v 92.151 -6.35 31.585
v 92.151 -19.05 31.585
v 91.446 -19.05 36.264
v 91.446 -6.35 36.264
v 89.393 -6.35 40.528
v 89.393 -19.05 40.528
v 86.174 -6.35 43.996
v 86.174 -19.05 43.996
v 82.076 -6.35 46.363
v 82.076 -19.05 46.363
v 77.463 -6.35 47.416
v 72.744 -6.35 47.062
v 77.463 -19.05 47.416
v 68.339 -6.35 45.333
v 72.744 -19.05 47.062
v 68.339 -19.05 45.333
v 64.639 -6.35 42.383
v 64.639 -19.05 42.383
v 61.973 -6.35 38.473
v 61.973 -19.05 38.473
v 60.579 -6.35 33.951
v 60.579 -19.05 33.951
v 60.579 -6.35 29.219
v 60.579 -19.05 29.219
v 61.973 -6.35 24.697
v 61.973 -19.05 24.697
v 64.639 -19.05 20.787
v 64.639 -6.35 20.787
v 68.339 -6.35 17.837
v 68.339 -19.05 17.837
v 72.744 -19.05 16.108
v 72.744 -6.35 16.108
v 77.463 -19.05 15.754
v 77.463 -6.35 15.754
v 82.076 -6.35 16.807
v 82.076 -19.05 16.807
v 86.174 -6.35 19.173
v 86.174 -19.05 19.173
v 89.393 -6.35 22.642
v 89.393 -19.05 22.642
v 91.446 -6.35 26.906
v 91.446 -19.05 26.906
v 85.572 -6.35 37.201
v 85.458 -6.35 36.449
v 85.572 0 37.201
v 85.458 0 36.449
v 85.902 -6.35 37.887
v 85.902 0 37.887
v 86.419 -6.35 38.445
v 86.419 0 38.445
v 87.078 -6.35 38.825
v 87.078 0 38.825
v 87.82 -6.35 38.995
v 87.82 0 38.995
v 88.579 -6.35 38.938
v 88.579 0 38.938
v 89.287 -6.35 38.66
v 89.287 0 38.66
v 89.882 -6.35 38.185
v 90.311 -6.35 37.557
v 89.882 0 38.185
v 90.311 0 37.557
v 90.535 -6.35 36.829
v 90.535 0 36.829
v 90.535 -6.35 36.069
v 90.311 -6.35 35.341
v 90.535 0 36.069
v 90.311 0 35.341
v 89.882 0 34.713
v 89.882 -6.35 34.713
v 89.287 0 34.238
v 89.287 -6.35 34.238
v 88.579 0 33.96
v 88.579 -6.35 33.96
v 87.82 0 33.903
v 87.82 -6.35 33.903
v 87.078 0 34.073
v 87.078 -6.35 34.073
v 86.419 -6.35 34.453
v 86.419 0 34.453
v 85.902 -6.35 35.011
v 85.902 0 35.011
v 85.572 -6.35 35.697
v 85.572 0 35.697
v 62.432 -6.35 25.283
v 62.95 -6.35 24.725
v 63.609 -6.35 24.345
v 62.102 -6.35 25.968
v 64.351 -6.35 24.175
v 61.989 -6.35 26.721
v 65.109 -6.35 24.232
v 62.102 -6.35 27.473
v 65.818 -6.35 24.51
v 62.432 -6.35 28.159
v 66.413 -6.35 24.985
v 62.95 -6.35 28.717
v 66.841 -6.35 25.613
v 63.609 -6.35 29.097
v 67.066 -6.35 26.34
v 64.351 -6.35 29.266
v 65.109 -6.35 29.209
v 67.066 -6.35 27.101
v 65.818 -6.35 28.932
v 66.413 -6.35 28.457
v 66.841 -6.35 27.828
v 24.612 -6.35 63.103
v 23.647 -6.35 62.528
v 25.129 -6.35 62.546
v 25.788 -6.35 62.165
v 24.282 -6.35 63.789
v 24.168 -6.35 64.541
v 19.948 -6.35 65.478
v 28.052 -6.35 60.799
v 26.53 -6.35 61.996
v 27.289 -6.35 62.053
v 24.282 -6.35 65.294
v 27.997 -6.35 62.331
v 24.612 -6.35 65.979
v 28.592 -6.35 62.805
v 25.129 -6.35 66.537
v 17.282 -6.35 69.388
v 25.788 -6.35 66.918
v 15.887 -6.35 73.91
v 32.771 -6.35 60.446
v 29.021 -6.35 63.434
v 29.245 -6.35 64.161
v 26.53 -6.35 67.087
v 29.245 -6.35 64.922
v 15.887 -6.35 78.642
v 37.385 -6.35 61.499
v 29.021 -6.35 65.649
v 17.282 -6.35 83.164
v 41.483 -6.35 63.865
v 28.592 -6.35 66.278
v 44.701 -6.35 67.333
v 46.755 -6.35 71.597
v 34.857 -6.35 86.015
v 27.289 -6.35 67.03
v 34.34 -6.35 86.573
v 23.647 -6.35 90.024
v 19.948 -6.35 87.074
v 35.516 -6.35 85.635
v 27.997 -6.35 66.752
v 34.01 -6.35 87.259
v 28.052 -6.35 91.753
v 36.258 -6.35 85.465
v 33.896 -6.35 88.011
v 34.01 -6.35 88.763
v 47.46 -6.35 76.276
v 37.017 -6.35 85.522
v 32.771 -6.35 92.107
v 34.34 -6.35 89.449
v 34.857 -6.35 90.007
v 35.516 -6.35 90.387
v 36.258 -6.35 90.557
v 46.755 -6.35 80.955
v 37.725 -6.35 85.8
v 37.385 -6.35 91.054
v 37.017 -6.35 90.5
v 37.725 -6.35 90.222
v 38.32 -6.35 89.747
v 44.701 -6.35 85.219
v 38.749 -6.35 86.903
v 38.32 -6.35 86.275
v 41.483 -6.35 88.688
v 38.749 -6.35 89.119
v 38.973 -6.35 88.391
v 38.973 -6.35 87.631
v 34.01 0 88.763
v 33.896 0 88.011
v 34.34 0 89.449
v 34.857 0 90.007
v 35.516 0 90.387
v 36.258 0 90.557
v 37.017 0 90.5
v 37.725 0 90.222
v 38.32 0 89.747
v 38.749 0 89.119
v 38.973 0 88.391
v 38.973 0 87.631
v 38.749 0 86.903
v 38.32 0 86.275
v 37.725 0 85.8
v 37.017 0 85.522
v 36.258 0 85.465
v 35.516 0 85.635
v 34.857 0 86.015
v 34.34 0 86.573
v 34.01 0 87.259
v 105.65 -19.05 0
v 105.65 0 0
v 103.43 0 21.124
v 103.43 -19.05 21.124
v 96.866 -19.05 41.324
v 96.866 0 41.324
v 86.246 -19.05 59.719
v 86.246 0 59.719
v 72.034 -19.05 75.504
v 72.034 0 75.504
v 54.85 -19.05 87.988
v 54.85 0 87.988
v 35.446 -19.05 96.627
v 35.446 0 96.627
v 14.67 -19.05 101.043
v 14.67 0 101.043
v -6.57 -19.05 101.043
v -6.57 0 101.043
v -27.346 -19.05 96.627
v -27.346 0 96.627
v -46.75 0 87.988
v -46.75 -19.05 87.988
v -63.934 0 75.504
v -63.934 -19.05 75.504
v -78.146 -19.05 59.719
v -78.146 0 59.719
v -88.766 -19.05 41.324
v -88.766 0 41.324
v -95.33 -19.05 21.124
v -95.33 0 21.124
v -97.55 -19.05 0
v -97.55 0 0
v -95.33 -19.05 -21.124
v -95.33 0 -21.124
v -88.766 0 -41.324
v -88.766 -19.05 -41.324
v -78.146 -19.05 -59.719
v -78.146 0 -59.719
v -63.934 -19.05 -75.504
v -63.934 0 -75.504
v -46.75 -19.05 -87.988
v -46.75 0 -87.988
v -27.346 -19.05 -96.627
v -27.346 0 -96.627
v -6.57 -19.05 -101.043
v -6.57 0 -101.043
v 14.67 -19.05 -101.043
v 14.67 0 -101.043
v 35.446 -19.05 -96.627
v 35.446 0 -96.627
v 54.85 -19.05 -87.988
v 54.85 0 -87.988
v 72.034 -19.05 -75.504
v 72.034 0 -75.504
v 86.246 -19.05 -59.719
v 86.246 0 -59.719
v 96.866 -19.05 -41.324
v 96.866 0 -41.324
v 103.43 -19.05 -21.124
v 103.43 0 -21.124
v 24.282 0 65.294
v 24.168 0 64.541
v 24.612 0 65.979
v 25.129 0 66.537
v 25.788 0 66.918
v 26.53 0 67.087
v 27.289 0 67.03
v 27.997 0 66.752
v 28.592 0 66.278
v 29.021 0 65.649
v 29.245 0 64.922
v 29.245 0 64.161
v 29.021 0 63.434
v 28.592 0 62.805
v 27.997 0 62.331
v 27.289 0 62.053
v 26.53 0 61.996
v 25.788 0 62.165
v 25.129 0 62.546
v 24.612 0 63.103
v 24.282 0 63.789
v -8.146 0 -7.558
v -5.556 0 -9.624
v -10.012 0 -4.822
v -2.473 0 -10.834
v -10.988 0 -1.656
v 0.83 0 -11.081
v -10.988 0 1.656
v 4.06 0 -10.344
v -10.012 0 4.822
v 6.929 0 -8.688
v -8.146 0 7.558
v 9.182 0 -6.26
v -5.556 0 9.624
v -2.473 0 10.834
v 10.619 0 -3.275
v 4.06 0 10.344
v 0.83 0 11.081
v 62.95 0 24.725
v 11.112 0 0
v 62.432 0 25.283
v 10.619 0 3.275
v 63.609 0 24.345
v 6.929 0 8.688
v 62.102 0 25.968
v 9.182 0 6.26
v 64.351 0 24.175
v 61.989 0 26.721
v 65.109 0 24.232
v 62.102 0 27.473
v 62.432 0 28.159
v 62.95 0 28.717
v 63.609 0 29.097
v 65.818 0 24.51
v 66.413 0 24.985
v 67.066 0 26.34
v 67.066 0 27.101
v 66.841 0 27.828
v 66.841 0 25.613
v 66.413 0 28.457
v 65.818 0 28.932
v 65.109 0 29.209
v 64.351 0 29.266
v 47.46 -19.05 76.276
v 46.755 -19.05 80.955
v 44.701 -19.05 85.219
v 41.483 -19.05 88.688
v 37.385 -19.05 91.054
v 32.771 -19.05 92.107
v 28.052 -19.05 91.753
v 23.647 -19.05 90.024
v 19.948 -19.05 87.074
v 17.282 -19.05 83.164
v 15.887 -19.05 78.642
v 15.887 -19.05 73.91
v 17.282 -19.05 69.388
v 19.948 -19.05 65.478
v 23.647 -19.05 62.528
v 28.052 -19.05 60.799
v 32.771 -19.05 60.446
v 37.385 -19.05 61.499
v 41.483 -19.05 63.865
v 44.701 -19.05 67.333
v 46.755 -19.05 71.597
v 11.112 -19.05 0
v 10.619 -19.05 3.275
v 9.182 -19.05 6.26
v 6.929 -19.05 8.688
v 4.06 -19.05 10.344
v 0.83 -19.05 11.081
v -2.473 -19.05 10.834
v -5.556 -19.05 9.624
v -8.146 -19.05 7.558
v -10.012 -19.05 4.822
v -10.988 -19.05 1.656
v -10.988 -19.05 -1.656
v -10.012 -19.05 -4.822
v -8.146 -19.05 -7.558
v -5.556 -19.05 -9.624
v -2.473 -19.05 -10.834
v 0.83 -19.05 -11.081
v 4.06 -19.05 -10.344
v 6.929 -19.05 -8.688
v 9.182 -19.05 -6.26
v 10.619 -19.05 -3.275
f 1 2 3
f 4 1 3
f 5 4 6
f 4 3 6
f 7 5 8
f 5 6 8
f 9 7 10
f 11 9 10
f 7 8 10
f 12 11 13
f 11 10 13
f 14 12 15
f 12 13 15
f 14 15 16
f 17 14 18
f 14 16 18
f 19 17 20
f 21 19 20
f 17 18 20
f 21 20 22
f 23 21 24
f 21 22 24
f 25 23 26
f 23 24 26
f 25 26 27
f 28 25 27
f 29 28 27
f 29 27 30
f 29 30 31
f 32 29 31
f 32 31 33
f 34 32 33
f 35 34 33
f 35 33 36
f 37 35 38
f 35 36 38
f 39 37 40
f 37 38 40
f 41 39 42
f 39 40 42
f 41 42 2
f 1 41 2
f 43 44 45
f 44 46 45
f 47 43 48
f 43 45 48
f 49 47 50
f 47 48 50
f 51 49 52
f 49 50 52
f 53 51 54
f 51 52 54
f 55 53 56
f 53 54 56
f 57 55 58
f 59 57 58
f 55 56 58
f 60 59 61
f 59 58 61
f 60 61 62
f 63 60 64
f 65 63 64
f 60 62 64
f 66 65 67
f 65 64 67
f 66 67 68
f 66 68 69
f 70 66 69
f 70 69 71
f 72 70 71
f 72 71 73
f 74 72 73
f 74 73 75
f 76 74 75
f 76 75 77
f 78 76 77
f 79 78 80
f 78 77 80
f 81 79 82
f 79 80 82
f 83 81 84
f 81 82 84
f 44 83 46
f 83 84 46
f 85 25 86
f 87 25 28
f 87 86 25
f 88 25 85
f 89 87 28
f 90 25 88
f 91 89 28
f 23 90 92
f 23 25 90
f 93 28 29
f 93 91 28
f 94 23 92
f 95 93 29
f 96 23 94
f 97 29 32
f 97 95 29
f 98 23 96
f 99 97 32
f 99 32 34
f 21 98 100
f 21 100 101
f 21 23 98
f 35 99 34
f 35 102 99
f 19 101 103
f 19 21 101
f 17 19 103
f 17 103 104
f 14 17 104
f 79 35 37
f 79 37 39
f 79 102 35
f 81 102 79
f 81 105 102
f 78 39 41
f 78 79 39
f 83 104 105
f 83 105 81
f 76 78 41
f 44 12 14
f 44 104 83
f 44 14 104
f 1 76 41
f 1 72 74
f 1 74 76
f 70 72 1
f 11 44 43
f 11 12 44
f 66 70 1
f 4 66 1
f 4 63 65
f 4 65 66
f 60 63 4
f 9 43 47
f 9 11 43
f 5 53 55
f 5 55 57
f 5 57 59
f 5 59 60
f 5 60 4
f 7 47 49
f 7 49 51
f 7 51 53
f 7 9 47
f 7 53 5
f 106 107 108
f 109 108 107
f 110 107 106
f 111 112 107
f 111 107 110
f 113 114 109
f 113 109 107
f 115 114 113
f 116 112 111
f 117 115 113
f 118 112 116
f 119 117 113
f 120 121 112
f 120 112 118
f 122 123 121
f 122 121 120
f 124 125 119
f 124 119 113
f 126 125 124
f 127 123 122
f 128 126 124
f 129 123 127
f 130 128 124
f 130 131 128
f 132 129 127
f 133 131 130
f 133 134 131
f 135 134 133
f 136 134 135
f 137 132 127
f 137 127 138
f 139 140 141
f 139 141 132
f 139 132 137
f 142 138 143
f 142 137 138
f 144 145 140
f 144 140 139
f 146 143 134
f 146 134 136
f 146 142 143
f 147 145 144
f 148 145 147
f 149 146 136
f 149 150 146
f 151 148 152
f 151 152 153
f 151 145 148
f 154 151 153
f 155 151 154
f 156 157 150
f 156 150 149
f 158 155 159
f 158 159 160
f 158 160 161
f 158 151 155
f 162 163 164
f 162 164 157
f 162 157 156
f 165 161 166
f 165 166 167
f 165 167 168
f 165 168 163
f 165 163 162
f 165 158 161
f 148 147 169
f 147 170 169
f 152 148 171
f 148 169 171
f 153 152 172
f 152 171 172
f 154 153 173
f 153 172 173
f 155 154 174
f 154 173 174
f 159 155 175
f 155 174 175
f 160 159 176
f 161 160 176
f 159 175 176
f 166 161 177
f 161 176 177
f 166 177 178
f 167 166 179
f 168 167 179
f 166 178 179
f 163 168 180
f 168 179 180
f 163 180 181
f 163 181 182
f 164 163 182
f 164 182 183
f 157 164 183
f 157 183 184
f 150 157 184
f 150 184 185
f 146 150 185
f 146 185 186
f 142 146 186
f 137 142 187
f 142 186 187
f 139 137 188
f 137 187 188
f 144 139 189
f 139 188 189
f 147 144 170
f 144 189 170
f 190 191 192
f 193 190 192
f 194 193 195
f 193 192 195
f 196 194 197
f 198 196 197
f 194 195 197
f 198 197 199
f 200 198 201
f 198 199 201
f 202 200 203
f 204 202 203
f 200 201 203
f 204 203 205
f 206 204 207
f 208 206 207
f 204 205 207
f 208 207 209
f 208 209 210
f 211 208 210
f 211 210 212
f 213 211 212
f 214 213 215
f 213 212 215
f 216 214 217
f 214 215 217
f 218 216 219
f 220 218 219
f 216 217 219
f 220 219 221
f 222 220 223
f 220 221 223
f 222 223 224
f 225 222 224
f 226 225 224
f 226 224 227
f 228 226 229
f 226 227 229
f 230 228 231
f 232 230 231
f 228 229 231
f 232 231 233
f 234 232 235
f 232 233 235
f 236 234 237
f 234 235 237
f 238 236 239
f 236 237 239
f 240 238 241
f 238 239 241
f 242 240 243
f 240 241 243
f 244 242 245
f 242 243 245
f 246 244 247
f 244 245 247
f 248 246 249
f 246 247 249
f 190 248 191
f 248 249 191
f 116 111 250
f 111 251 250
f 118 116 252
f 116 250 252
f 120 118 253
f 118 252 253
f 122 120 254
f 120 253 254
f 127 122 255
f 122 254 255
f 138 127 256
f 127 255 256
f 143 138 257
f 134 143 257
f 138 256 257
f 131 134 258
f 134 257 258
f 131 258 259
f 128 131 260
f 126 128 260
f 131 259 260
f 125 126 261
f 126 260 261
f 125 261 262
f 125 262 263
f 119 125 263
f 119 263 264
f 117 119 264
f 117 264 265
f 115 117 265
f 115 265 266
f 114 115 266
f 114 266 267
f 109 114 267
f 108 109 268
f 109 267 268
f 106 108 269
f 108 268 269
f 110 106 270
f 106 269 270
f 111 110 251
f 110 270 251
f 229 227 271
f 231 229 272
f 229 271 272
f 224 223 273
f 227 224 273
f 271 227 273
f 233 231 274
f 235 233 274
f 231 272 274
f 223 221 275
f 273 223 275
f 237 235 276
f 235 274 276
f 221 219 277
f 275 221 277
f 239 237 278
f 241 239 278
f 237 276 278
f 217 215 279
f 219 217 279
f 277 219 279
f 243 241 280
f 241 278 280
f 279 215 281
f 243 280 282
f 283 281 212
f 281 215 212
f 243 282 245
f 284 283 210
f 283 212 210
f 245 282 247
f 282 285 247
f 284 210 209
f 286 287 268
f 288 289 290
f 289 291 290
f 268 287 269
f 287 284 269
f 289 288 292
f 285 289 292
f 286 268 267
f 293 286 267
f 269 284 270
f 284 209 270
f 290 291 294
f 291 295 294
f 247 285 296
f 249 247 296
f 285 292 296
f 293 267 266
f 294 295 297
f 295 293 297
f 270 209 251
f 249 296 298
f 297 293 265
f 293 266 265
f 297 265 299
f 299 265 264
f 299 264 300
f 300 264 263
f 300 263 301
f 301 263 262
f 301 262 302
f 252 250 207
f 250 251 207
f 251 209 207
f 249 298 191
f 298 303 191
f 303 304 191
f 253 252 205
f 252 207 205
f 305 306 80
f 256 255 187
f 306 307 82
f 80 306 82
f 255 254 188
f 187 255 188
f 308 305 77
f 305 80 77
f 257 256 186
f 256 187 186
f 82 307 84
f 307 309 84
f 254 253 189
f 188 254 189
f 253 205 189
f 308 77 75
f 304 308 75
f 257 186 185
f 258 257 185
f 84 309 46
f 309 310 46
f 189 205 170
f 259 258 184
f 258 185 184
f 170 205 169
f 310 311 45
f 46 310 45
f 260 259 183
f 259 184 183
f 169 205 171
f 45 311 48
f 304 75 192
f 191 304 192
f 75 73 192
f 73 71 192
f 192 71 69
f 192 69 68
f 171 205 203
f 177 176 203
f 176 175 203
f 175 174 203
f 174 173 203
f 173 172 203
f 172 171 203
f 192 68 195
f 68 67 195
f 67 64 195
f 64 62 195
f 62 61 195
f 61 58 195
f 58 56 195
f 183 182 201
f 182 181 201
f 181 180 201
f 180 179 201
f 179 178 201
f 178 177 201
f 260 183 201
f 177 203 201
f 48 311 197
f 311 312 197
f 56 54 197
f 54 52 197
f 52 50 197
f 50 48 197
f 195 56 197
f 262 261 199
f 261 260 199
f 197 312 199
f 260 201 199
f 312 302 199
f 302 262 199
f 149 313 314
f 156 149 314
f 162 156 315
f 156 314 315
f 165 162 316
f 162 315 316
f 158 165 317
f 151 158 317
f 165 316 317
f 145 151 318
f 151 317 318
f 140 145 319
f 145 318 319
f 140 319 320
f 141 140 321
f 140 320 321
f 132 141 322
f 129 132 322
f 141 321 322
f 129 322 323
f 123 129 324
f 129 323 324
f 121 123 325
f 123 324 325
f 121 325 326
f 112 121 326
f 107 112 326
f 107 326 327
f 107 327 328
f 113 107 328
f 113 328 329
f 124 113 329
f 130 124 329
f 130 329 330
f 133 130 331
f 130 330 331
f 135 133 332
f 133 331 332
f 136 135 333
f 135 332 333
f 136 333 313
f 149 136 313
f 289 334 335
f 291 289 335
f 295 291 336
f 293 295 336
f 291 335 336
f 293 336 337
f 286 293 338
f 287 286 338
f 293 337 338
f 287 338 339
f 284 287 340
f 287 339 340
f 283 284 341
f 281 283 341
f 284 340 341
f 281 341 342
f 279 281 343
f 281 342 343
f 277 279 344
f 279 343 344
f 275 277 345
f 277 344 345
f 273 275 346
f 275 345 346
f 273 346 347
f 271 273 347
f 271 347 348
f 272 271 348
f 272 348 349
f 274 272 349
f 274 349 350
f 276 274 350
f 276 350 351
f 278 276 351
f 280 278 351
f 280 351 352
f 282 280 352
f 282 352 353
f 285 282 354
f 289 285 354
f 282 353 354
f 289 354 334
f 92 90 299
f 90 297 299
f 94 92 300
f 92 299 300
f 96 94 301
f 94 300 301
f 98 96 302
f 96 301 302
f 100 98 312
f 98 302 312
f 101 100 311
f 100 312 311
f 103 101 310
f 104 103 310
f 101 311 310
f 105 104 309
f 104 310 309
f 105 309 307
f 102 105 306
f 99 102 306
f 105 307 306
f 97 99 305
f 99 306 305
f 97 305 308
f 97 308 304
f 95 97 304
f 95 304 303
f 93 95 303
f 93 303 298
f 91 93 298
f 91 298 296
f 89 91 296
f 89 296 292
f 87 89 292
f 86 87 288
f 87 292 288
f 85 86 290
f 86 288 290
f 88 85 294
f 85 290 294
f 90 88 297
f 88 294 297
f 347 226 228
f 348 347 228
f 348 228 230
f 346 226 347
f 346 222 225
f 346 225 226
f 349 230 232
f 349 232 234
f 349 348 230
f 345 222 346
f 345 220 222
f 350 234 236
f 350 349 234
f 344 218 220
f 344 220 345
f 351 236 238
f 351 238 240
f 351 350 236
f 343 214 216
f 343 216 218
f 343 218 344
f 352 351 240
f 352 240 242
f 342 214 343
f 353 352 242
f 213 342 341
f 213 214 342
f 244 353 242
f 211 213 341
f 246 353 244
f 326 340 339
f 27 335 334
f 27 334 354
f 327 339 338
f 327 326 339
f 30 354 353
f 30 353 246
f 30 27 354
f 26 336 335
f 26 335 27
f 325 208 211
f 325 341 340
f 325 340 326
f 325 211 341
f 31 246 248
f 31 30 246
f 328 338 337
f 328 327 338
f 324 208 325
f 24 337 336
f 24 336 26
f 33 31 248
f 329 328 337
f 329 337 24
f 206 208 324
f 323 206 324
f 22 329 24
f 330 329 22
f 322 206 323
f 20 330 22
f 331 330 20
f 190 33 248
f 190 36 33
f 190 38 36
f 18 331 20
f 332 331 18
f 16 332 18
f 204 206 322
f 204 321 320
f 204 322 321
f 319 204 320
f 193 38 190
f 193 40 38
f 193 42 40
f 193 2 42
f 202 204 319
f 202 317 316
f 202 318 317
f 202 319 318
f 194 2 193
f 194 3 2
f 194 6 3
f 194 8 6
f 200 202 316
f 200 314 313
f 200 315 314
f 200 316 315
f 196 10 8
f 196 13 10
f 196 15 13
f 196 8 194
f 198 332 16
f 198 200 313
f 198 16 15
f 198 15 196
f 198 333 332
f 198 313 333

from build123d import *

# Parameters (mm, degrees)
F0_R     = 101.6
F1_DEPTH = 19.05
F2_R     = 15.875
F3_DEPTH = 12.7
F4_R     = 11.1125
F5_DEPTH = 19.05
F6_D     = 5.1054
F6_DEPTH = 19.05
F6_TIP   = 1.5338169022


with BuildPart() as f1:
    # F0 (on Front) → F1 (new body)
    with BuildSketch(Plane.XZ):
        with Locations((4.050075005, 0)):
            Circle(F0_R)
    extrude(amount=F1_DEPTH)

    # F2 (on face) → F3 (cut)
    with BuildSketch(Plane.XZ.offset(19.05)):
        with Locations((31.5849, 76.2762)):
            Circle(F2_R)
        with Locations((76.2762, 31.5849)):
            Circle(F2_R)
    extrude(amount=-F3_DEPTH, mode=Mode.SUBTRACT)

    # F4 (on face) → F5 (cut)
    with BuildSketch(Plane.XZ.offset(19.05)):
        Circle(F4_R)
    extrude(amount=-F5_DEPTH, mode=Mode.SUBTRACT)

    # F6
    with Locations(Plane.XZ.offset(19.05)):
        with Locations((36.449, 88.011), (26.7208, 64.5414), (88.011, 36.449), (64.5414, 26.7208)):
            Hole(F6_D / 2, depth=F6_DEPTH)
            with Locations((0, 0, -(F6_DEPTH + F6_TIP / 2))):  # 118° drill point
                Cone(0, F6_D / 2, F6_TIP, mode=Mode.SUBTRACT)


solid = f1.part
